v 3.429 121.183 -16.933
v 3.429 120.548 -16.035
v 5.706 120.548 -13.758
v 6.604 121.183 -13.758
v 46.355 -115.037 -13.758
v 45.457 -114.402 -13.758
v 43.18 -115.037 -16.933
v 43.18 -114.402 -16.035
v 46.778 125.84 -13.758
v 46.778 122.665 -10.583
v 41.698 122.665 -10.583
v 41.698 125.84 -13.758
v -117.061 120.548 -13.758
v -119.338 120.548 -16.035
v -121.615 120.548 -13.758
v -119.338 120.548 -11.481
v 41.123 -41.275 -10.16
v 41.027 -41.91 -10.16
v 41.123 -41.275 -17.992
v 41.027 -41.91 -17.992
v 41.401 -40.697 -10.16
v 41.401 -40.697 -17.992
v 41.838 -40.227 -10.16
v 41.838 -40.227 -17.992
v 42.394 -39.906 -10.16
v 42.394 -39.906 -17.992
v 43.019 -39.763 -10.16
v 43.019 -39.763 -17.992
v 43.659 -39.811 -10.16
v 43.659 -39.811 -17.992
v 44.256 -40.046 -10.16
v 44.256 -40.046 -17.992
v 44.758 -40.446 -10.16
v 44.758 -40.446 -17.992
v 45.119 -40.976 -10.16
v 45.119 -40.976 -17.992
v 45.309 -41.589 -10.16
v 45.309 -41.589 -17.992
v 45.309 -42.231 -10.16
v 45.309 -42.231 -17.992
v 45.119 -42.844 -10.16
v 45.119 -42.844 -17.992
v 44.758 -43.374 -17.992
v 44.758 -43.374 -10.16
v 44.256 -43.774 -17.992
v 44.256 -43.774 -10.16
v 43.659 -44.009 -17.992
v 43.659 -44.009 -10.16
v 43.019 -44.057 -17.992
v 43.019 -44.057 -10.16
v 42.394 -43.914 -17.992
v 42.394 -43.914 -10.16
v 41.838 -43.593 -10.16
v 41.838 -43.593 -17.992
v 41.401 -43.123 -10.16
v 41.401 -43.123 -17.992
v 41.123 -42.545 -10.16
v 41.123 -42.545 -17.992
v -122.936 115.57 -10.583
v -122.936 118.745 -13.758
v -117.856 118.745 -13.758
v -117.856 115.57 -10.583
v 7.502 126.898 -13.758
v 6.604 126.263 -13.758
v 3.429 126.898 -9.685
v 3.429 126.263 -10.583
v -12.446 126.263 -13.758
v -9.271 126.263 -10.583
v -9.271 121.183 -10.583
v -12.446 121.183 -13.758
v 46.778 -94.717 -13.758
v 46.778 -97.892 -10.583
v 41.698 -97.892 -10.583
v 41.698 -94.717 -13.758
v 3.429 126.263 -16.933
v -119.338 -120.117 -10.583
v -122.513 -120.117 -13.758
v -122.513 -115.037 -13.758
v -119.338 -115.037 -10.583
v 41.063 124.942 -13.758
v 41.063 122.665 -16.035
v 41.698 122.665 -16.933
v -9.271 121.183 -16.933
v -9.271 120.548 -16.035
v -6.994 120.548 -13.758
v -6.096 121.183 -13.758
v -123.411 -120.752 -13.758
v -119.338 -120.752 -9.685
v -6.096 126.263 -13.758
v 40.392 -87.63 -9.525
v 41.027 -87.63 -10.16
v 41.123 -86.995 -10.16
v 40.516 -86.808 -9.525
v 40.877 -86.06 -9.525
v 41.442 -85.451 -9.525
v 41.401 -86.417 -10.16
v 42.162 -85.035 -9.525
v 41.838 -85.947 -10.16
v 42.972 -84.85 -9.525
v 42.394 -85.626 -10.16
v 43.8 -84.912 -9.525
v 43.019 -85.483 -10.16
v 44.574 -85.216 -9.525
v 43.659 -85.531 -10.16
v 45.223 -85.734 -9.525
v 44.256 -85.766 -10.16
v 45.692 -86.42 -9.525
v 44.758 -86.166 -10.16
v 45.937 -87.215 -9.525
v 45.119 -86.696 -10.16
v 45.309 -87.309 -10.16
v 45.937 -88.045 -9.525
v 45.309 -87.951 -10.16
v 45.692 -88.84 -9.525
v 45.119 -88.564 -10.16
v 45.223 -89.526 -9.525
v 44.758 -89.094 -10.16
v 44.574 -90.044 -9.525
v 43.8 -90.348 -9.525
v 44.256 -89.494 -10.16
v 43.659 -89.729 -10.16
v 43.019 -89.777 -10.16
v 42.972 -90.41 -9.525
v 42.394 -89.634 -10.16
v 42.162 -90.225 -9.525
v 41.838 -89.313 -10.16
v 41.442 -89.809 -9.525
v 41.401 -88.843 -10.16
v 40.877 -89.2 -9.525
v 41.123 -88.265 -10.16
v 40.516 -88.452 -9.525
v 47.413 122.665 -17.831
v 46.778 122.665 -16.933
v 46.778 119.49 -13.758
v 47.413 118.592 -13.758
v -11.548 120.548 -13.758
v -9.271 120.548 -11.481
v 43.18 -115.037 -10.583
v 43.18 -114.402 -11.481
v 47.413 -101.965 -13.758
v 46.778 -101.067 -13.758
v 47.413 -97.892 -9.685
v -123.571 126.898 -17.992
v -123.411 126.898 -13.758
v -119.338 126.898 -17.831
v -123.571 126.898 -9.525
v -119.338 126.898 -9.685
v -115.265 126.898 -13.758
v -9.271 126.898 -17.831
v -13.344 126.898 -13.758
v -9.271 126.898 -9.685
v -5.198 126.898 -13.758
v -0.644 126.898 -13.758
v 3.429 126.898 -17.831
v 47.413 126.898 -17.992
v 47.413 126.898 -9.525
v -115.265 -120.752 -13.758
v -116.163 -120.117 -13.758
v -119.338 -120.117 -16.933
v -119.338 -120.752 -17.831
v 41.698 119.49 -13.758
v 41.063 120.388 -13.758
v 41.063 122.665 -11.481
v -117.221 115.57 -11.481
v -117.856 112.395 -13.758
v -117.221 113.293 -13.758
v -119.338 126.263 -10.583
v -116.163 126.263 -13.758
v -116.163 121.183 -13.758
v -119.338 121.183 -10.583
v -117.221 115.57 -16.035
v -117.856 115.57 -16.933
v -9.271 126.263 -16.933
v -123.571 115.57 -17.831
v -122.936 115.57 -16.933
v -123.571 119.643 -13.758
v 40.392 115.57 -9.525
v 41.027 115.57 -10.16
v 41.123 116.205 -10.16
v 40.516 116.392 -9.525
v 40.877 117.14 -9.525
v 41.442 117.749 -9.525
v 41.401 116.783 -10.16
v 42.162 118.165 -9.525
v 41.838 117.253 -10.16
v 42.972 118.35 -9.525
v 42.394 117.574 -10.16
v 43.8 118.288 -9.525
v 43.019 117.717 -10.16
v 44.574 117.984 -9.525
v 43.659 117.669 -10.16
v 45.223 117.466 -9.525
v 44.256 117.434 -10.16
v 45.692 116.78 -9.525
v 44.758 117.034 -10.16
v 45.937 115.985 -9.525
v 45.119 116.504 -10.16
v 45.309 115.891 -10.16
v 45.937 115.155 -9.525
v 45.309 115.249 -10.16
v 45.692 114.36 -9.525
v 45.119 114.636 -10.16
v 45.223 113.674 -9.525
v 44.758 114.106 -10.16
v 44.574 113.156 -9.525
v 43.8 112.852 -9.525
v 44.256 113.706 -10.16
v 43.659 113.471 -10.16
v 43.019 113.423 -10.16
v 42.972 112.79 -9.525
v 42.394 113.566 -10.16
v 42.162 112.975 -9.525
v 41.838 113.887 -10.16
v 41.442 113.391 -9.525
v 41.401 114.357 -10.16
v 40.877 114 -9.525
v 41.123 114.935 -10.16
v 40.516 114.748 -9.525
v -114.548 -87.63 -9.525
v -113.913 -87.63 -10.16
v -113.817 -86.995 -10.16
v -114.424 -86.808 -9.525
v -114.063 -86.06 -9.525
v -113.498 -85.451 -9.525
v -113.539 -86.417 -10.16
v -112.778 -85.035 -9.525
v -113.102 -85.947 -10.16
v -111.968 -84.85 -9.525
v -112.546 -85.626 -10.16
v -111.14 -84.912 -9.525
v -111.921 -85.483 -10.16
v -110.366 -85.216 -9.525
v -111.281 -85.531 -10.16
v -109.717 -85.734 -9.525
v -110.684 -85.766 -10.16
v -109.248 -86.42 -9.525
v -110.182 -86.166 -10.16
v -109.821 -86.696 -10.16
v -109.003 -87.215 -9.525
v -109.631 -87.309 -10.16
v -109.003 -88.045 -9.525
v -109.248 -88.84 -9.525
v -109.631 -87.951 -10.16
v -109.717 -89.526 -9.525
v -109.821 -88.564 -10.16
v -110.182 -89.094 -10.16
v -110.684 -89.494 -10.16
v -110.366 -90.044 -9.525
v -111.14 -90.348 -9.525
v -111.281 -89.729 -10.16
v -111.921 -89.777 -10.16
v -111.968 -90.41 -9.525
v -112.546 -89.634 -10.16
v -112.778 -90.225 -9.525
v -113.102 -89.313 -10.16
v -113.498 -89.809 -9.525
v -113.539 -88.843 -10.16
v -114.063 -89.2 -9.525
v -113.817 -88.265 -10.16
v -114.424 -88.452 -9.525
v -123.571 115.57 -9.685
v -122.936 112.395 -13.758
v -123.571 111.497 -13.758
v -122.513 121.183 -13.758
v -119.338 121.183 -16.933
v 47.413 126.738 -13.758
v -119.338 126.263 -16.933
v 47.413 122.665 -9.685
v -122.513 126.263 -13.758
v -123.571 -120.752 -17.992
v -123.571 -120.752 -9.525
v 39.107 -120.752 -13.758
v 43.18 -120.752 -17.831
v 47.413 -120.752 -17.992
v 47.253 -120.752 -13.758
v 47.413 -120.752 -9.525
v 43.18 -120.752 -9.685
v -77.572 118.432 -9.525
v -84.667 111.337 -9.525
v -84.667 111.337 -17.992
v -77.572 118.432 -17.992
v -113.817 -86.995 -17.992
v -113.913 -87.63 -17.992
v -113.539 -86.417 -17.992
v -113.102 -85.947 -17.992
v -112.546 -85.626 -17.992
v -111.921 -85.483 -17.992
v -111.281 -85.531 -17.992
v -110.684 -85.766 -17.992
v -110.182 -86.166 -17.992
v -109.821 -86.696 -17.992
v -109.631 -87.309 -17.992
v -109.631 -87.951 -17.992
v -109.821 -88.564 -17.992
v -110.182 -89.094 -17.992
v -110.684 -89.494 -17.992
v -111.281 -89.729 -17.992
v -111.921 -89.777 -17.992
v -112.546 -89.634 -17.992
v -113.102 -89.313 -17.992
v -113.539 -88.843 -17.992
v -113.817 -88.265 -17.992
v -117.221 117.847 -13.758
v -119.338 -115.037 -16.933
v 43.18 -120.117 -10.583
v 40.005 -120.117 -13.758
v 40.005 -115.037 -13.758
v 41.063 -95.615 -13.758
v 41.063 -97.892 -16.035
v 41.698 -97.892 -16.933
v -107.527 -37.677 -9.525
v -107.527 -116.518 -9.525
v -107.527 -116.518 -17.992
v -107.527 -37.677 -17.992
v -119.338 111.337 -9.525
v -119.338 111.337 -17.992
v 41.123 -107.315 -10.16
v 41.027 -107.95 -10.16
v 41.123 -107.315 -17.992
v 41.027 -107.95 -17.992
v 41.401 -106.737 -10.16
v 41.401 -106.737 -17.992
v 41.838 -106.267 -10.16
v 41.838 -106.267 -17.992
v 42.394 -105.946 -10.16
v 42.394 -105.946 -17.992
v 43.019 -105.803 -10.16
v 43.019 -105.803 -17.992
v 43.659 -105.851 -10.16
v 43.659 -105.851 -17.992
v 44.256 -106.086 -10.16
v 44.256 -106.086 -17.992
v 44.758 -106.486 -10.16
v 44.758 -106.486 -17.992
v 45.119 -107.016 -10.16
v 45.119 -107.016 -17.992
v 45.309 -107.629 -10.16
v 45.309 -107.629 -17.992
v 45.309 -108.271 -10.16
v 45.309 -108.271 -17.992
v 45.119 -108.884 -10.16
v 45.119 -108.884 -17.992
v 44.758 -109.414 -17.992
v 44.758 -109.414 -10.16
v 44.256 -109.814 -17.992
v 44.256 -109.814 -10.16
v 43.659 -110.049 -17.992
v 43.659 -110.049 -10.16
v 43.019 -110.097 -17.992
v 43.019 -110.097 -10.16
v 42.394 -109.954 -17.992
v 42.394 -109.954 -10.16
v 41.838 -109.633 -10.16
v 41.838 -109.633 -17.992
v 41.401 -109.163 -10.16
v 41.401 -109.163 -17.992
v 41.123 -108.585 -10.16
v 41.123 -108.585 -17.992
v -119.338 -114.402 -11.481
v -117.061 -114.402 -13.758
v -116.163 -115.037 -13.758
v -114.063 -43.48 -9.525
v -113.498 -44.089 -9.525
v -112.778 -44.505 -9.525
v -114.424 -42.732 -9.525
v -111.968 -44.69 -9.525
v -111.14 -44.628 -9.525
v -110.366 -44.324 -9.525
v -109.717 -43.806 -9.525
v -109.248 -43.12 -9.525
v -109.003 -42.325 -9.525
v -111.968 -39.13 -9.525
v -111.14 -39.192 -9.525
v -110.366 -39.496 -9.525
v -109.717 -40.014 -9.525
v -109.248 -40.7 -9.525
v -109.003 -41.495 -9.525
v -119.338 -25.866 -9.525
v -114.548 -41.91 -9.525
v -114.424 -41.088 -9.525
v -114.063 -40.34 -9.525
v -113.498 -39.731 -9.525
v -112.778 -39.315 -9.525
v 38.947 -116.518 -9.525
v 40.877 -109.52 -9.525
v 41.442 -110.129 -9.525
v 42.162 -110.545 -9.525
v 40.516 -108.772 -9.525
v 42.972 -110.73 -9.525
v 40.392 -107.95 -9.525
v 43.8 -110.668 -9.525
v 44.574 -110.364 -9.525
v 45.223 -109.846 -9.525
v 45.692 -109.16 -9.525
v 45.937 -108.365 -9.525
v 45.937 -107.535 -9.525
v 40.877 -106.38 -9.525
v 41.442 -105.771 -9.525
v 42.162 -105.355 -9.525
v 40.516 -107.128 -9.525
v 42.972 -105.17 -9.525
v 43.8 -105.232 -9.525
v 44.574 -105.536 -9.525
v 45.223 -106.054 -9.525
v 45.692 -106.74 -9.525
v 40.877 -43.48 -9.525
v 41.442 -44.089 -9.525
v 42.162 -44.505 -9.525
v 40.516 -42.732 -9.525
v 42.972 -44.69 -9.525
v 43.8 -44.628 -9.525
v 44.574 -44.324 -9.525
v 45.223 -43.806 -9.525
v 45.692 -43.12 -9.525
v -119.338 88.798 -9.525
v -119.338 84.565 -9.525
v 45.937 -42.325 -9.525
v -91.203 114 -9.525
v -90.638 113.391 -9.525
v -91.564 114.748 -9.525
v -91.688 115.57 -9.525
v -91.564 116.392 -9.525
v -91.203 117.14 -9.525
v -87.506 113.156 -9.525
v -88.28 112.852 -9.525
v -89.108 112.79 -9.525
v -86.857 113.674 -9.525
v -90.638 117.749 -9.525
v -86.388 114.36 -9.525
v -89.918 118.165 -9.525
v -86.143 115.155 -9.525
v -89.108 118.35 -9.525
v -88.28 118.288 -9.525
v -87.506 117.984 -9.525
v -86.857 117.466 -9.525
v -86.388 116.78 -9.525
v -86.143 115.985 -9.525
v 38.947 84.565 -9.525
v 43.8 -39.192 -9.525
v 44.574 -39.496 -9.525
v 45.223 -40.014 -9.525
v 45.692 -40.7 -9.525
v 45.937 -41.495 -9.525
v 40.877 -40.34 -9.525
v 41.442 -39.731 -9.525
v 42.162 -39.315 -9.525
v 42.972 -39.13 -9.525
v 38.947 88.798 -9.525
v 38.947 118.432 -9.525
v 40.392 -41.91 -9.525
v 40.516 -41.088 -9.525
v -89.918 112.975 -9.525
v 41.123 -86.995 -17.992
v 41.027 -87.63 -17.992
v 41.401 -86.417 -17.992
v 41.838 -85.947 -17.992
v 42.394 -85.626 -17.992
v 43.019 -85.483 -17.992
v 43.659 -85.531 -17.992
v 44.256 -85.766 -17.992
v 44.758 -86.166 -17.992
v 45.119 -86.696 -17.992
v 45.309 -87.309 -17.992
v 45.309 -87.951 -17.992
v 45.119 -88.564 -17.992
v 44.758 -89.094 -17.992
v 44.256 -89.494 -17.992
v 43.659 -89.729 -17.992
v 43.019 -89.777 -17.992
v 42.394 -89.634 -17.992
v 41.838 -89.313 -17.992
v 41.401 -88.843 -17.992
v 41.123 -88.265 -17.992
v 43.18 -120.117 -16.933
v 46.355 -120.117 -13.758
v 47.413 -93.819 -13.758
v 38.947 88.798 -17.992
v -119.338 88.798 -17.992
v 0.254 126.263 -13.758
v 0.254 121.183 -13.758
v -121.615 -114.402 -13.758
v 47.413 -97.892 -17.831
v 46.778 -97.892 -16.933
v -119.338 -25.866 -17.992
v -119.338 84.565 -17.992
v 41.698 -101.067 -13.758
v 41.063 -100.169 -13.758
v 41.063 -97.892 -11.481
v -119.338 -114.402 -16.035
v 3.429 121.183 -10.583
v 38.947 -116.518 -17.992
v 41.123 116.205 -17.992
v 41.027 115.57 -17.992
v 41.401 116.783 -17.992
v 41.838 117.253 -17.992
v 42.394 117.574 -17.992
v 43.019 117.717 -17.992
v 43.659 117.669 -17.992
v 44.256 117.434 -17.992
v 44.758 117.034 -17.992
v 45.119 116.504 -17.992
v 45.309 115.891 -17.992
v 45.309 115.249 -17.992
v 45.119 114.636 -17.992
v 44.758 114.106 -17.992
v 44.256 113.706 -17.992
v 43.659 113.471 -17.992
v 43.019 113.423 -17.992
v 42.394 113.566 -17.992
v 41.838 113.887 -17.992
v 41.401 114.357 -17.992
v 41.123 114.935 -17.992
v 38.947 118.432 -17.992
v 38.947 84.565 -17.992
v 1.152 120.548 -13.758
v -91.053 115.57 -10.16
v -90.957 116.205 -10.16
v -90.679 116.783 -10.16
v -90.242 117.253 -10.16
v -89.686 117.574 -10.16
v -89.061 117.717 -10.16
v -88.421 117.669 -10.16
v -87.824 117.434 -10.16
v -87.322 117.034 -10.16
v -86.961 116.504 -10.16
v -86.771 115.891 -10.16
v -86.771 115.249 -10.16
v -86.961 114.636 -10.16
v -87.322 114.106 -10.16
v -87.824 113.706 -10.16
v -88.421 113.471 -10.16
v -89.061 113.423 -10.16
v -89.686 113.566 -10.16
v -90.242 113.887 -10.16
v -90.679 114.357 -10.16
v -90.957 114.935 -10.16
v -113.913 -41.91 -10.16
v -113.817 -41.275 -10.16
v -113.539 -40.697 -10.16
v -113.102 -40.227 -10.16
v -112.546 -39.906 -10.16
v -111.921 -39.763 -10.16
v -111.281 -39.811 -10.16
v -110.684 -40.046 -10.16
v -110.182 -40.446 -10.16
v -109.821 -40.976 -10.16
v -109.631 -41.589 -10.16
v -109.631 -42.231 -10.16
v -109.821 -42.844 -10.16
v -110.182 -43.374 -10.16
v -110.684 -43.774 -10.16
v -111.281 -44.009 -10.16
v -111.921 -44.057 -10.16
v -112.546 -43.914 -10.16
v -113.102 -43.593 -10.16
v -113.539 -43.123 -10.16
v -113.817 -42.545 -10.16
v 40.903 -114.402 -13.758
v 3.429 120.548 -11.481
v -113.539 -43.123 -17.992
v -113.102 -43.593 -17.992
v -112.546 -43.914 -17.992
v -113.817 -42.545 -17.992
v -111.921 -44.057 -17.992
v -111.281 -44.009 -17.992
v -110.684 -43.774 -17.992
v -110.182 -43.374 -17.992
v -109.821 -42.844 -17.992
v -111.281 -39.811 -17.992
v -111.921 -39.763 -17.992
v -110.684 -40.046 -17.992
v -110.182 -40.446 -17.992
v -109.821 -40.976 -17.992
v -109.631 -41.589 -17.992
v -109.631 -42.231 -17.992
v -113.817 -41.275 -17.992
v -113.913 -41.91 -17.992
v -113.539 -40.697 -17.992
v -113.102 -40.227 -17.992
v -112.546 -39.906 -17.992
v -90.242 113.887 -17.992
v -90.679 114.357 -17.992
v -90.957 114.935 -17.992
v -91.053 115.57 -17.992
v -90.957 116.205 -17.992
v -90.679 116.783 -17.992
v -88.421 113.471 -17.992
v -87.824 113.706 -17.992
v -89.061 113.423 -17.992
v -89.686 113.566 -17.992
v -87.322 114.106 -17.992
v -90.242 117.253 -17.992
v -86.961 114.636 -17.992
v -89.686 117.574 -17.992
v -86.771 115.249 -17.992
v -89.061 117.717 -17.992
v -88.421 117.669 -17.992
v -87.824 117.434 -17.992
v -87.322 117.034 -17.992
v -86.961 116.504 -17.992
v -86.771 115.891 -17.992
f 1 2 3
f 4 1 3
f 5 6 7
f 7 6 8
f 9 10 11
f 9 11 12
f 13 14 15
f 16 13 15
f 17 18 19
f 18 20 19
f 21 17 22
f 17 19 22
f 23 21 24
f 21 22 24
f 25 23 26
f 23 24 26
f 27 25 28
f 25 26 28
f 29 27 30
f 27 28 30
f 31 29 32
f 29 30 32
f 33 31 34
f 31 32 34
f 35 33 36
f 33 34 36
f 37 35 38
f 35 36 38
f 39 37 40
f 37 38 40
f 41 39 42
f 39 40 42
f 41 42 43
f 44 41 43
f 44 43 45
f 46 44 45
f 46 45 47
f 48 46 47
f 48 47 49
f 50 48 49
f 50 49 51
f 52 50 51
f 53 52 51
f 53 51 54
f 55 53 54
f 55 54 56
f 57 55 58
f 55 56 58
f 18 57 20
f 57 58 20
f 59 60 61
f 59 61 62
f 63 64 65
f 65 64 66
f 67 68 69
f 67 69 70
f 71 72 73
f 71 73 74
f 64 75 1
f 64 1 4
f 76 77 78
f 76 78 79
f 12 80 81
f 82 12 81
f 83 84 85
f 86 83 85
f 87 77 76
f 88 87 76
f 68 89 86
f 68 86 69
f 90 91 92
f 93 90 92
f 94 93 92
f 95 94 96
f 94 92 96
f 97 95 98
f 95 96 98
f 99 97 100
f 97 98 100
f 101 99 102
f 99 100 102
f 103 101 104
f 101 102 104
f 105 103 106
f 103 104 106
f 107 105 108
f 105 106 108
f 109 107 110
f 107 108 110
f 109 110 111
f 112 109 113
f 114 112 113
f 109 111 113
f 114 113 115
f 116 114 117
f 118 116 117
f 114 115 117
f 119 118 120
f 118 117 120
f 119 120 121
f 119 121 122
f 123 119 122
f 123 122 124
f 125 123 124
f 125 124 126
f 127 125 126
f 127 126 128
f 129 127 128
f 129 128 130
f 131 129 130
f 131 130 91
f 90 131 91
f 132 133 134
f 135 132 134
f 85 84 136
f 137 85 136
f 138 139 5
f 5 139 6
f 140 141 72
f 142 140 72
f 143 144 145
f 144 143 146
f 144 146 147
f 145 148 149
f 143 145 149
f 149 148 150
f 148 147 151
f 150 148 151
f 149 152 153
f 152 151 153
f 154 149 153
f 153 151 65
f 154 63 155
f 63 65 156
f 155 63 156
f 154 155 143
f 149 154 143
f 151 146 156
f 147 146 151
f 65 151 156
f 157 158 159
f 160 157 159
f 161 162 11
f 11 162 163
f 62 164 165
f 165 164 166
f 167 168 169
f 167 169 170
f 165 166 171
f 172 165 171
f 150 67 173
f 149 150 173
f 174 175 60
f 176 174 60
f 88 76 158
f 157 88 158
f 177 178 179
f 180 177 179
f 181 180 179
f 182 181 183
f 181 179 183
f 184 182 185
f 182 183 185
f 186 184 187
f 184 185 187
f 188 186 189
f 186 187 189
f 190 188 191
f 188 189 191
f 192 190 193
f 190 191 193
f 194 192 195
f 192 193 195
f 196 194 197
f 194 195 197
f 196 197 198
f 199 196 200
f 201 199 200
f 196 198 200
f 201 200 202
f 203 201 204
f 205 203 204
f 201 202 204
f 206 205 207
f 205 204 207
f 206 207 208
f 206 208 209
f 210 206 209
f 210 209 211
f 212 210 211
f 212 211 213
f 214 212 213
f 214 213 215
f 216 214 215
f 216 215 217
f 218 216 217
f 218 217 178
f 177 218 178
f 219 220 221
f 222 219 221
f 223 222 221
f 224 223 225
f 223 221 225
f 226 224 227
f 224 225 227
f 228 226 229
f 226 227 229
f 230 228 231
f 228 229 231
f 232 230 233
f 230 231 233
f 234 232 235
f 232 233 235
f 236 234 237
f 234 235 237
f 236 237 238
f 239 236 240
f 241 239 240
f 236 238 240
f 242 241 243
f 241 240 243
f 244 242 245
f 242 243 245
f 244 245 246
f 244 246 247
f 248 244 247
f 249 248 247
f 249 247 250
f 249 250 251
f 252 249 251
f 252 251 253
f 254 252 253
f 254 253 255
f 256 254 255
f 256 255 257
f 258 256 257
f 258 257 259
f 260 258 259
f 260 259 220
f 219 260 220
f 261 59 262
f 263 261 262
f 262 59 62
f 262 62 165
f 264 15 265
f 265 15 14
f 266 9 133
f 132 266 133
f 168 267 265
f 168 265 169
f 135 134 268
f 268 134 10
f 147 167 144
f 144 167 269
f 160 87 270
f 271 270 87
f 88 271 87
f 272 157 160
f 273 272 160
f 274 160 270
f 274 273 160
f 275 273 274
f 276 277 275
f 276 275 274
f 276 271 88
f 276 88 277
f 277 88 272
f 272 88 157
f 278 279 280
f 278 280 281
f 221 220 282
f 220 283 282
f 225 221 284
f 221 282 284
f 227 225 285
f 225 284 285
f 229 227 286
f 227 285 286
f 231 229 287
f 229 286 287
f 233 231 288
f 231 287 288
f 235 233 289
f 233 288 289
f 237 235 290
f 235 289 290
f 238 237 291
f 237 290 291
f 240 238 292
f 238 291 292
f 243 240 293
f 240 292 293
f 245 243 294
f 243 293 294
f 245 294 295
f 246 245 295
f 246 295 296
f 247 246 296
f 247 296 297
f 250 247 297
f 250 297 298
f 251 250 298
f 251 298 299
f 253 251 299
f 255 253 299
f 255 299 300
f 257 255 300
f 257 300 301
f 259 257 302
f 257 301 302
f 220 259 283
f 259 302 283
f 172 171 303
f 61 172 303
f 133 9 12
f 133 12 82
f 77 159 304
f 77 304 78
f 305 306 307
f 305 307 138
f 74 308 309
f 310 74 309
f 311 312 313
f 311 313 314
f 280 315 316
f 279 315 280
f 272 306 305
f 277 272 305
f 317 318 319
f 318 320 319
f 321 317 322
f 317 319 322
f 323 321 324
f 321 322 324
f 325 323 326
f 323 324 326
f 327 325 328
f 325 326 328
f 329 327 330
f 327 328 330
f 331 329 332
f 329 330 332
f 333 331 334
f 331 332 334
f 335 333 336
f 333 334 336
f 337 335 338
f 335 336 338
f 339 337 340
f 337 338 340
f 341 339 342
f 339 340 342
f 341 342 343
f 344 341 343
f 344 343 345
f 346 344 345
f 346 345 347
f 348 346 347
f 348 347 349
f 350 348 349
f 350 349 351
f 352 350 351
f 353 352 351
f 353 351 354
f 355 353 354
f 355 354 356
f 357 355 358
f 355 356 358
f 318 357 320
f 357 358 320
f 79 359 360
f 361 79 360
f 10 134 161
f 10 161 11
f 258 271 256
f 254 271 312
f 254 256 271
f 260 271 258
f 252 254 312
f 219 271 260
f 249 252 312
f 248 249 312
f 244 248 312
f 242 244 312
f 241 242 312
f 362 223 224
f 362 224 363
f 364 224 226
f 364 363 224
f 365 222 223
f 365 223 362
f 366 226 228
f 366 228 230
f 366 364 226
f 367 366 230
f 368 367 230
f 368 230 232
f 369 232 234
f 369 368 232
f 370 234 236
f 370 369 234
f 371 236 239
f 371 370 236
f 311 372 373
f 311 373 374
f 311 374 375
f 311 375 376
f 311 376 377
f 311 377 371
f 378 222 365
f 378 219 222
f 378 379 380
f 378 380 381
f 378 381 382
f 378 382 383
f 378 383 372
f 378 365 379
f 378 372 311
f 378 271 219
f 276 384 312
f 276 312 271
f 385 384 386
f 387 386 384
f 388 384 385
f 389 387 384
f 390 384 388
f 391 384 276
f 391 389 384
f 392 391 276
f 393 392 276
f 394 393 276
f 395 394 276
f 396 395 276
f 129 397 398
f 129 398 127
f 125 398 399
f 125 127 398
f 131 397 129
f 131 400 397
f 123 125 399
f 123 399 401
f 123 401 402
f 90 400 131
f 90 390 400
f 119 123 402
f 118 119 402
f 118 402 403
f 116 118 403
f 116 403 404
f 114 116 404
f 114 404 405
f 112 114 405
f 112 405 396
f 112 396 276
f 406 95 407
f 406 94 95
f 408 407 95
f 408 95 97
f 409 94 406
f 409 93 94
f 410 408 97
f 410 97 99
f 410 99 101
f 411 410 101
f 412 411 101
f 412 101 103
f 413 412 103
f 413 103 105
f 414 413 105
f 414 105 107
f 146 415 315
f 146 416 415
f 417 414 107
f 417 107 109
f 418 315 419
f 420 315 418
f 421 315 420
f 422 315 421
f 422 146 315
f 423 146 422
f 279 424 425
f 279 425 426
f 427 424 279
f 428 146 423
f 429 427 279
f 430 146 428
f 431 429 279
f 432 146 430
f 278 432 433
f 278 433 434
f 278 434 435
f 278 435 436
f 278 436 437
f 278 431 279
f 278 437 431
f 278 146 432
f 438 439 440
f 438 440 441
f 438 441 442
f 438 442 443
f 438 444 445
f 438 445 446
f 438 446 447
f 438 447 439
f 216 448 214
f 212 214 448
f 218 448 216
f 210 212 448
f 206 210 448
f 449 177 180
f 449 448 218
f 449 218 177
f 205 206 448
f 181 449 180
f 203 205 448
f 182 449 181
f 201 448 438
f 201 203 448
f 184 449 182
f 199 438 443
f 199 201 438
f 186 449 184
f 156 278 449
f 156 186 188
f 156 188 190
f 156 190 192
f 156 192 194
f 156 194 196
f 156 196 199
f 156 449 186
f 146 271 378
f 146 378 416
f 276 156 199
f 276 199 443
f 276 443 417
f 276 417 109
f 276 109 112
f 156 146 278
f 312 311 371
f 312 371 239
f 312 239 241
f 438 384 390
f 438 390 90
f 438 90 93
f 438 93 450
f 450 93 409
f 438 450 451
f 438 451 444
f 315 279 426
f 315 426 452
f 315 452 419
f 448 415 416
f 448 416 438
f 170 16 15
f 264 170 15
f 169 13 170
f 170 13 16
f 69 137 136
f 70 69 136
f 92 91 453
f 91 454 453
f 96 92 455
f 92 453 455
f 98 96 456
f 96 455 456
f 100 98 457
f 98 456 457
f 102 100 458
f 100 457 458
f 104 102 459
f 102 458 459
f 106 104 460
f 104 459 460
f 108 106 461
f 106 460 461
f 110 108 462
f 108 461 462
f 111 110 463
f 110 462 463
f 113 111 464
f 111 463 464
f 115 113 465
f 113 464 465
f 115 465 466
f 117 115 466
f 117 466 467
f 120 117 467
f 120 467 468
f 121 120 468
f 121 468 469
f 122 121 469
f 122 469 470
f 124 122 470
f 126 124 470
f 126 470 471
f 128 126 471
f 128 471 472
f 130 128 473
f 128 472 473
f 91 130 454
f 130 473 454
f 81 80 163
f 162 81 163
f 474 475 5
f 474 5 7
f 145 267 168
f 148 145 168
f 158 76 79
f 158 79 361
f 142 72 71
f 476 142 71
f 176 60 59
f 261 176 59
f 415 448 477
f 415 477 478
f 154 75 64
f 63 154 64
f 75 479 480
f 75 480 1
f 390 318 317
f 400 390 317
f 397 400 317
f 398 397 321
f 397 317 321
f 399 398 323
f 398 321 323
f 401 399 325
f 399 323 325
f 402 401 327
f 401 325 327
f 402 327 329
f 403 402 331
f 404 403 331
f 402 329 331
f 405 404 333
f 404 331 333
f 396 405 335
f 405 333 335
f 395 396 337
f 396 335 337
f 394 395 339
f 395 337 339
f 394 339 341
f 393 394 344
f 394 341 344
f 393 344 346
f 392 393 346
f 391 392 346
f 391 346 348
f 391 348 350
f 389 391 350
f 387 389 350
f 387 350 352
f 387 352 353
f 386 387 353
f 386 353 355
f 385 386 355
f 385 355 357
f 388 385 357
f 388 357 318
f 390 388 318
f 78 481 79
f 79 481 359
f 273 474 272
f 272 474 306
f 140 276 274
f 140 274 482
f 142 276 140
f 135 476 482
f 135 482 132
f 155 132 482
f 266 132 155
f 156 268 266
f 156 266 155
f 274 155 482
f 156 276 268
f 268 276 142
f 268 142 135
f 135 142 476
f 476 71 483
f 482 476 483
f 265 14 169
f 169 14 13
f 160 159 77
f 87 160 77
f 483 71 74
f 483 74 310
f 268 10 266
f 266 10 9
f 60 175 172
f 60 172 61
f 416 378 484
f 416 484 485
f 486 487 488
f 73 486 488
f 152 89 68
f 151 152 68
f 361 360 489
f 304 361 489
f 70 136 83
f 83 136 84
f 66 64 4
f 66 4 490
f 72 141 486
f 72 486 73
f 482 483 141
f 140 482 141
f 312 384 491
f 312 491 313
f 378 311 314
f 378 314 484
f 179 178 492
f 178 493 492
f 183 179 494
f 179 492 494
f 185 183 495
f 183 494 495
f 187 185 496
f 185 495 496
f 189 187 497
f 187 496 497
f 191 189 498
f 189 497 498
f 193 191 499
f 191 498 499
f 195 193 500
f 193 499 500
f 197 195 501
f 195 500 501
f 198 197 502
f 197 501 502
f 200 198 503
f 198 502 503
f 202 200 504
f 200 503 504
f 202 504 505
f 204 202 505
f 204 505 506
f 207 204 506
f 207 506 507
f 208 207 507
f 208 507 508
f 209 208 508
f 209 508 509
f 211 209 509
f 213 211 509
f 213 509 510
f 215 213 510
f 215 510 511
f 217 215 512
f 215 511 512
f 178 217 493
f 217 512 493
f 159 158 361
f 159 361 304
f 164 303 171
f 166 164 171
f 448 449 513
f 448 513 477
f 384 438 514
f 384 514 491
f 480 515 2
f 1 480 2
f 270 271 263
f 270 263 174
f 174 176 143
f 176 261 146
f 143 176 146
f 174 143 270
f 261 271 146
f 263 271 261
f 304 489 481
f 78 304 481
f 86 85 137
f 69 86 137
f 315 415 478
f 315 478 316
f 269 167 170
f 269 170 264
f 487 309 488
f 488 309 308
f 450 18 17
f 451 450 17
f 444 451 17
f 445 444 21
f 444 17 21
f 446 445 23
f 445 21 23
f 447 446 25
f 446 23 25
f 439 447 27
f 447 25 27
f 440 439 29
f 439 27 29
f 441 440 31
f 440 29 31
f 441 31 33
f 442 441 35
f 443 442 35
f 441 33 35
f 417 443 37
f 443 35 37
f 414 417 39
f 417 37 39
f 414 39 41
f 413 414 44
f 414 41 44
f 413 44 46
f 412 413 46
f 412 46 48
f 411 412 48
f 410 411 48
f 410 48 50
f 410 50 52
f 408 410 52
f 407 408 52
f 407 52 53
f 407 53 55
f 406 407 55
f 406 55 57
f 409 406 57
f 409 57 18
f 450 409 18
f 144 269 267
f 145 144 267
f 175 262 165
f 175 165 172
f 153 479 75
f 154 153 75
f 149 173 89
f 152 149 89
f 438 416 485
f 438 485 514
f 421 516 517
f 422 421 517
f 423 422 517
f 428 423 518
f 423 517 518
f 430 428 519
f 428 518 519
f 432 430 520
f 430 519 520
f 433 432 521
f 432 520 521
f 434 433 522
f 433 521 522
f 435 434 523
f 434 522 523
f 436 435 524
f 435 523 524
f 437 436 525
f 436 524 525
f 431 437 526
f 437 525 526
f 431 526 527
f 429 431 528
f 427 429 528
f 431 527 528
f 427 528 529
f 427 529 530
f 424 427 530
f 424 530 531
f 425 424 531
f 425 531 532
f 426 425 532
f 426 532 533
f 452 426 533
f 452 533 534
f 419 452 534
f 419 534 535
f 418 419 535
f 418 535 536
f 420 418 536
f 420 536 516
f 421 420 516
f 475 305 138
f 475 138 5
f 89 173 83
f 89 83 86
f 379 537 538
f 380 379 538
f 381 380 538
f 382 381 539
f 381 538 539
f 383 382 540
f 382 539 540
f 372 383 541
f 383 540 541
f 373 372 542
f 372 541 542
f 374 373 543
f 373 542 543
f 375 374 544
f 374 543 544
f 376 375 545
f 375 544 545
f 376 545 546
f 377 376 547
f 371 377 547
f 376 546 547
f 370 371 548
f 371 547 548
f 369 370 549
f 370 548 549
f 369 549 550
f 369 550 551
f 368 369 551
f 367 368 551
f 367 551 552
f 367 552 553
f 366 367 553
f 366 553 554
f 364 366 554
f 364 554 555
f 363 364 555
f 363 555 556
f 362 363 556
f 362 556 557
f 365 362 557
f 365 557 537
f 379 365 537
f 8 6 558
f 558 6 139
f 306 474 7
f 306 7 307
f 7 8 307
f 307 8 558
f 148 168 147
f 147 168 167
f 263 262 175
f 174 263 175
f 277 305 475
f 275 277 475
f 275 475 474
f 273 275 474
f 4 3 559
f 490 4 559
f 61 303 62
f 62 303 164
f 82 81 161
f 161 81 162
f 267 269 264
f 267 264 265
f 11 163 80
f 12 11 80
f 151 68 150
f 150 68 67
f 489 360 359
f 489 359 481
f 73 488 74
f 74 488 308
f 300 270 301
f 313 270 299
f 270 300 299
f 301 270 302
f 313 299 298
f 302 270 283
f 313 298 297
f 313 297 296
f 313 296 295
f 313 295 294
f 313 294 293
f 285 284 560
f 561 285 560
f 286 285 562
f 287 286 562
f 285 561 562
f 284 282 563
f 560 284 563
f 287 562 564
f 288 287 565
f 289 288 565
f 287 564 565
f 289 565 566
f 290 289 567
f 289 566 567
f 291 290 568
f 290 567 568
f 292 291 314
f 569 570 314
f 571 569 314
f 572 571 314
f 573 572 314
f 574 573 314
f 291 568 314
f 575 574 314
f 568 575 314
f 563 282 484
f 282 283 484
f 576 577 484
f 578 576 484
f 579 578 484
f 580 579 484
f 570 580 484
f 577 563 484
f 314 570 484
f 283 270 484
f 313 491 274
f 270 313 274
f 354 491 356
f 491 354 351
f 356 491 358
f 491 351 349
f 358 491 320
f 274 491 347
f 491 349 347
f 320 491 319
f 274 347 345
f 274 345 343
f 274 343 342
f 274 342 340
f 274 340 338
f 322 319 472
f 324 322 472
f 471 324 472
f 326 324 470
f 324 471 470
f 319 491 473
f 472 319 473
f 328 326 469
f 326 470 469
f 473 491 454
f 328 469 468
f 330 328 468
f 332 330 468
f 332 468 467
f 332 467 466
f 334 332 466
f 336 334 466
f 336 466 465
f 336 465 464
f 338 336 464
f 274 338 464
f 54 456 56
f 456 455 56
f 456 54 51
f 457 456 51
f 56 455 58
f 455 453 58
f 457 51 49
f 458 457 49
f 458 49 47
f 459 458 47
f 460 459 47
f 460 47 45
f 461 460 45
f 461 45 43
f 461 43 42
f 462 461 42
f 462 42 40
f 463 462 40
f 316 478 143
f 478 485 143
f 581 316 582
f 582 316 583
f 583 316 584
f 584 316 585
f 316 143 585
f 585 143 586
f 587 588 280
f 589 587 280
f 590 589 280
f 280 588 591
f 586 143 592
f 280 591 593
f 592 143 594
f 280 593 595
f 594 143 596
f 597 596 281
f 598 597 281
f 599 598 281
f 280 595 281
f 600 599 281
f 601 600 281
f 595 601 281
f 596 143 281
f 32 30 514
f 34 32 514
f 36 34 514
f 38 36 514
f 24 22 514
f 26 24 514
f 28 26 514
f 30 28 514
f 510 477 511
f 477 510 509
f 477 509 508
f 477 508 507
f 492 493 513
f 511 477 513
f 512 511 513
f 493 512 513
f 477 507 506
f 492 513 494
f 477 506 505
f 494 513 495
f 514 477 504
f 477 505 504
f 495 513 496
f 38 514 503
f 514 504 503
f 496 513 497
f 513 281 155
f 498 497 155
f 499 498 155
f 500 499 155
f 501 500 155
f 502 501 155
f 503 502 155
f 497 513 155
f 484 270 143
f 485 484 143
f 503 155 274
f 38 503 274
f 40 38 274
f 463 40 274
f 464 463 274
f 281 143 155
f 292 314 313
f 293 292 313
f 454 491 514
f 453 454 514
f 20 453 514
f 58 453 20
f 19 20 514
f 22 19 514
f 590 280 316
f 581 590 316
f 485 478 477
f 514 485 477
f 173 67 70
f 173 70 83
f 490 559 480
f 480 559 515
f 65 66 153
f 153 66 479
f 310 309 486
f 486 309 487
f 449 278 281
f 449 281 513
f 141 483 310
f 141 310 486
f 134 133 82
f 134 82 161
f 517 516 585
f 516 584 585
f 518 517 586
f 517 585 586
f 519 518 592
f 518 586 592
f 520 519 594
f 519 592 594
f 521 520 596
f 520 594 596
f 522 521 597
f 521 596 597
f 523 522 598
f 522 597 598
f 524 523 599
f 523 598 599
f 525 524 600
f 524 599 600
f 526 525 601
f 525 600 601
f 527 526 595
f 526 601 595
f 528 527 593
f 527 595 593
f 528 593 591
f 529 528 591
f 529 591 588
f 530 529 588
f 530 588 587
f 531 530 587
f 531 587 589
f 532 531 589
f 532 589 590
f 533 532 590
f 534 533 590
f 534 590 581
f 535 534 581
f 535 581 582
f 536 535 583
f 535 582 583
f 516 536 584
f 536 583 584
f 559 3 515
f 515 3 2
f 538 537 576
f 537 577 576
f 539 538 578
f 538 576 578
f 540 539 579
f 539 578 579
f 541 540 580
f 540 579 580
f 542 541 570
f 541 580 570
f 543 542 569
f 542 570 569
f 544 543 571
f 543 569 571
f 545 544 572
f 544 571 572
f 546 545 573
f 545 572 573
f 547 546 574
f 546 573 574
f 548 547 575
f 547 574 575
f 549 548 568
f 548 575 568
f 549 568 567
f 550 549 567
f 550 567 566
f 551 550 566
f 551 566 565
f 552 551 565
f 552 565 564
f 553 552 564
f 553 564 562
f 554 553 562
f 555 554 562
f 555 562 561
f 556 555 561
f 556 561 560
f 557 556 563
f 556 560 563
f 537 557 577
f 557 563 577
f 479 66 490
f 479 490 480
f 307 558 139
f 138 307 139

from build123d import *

# Parameters (mm, degrees)
BOSS_EXTRUDE1_START                    = -9.525
SKETCH1_W                              = 170.984333333
SKETCH1_H                              = 247.65
BOSS_EXTRUDE1_DEPTH                    = 8.466666667
F_18_0_1695_DIAMETER_HOLE1_D           = 4.3053
F_18_0_1695_DIAMETER_HOLE1_CSINK_D     = 5.5753
F_18_0_1695_DIAMETER_HOLE1_CSINK_ANGLE = 90
BOTTOM_PINS_DEPTH                      = 6.35
REAR_PINS_DEPTH                        = 6.35
FRONT_PINS_DEPTH                       = 6.35
CUT_EXTRUDE1_DEPTH                     = 6.35
PIN_CHAMFERS_SIZE                      = 0.635


with BuildPart() as part:
    # Sketch1 → Boss-Extrude1 (new body)
    with BuildSketch(Plane.XY.offset(BOSS_EXTRUDE1_START)):
        with Locations((-38.078833334, 3.0734)):
            Rectangle(SKETCH1_W, SKETCH1_H)
        Polygon((-107.526666667, -116.518266667), (-107.526666667, -37.676666709), (-119.337666709, -25.865666667), (-119.337666709, 84.565066667), (38.946666667, 84.565066667), (38.946666667, -116.518266667), align=None, mode=Mode.SUBTRACT)
        Polygon((-119.337666709, 111.336666667), (-84.666666667, 111.336666667), (-77.5716, 118.431733333), (38.946666667, 118.431733333), (38.946666667, 88.7984), (-119.337666709, 88.7984), align=None, mode=Mode.SUBTRACT)
    extrude(amount=-BOSS_EXTRUDE1_DEPTH)

    # #18 (0.1695) Diameter Hole1 (through all)
    with Locations(Plane.XY.offset(-9.525)):
        with Locations((-88.9, 115.57), (43.18, 115.57), (43.18, -41.91), (43.18, -87.63), (43.18, -107.95), (-111.76, -87.63), (-111.76, -41.91)):
            CounterSinkHole(F_18_0_1695_DIAMETER_HOLE1_D / 2, F_18_0_1695_DIAMETER_HOLE1_CSINK_D / 2, counter_sink_angle=F_18_0_1695_DIAMETER_HOLE1_CSINK_ANGLE)

    # Sketch2 → bottom pins (cut)
    with BuildSketch(Plane.XZ.offset(120.7516)):
        Polygon((-122.512666667, -13.758333333), (-119.337666667, -10.583333333), (-116.162666667, -13.758333333), (-119.337666667, -16.933333333), align=None)
        Polygon((40.005, -13.758333333), (43.18, -10.583333333), (46.355, -13.758333333), (43.18, -16.933333333), align=None)
    extrude(amount=-BOTTOM_PINS_DEPTH, mode=Mode.SUBTRACT)

    # Sketch3 → rear pins (cut)
    with BuildSketch(Plane.ZY.offset(123.571)):
        Polygon((-16.933333333, 115.57), (-13.758333333, 118.745), (-10.583333333, 115.57), (-13.758333333, 112.395), align=None)
    extrude(amount=-REAR_PINS_DEPTH, mode=Mode.SUBTRACT)

    # Sketch4 → front pins (cut)
    with BuildSketch(Plane(origin=(47.413333333, 0, 0), x_dir=(0, 0, -1), z_dir=(1, 0, 0))):
        Polygon((10.583333333, 122.665066667), (13.758333333, 125.840066667), (16.933333333, 122.665066667), (13.758333333, 119.490066667), align=None)
        Polygon((10.583333333, -97.8916), (13.758333333, -94.7166), (16.933333333, -97.8916), (13.758333333, -101.0666), align=None)
    extrude(amount=-FRONT_PINS_DEPTH, mode=Mode.SUBTRACT)

    # Sketch7 → Cut-Extrude1 (cut)
    with BuildSketch(Plane(origin=(0, 126.8984, 0), x_dir=(1, 0, 0), z_dir=(0, 1, 0))):
        Polygon((-6.095999915, 13.758333333), (-9.270999915, 10.583333333), (-12.445999915, 13.758333333), (-9.270999915, 16.933333333), align=None)
        Polygon((-116.162666667, 13.758333333), (-119.337666667, 10.583333333), (-122.512666667, 13.758333333), (-119.337666667, 16.933333333), align=None)
        Polygon((0.254000085, 13.758333333), (3.429000085, 16.933333333), (6.604000085, 13.758333333), (3.429000085, 10.583333333), align=None)
    extrude(amount=-CUT_EXTRUDE1_DEPTH, mode=Mode.SUBTRACT)

    # pin chamfers
    pin_chamfers_edges = [part.edges().sort_by_distance(p)[0] for p in [
        (-120.925166667, -114.4016, -15.345833333),
        (-120.925166667, -114.4016, -12.170833333),
        (-117.750166667, -114.4016, -12.170833333),
        (-117.750166667, -114.4016, -15.345833333),
        (-120.925166667, -120.7516, -15.345833333),
        (-117.750166667, -120.7516, -15.345833333),
        (-117.750166667, -120.7516, -12.170833333),
        (-120.925166667, -120.7516, -12.170833333),
        (41.5925, -114.4016, -15.345833333),
        (41.5925, -114.4016, -12.170833333),
        (44.7675, -114.4016, -12.170833333),
        (44.7675, -114.4016, -15.345833333),
        (41.5925, -120.7516, -15.345833333),
        (44.7675, -120.7516, -15.345833333),
        (44.7675, -120.7516, -12.170833333),
        (41.5925, -120.7516, -12.170833333),
        (-117.221, 113.9825, -15.345833333),
        (-117.221, 117.1575, -15.345833333),
        (-117.221, 117.1575, -12.170833333),
        (-117.221, 113.9825, -12.170833333),
        (-123.571, 113.9825, -15.345833333),
        (-123.571, 113.9825, -12.170833333),
        (-123.571, 117.1575, -12.170833333),
        (-123.571, 117.1575, -15.345833333),
        (41.063333333, 121.077566667, -12.170833333),
        (41.063333333, 124.252566667, -12.170833333),
        (41.063333333, 124.252566667, -15.345833333),
        (41.063333333, 121.077566667, -15.345833333),
        (47.413333333, 121.077566667, -12.170833333),
        (47.413333333, 121.077566667, -15.345833333),
        (47.413333333, 124.252566667, -15.345833333),
        (47.413333333, 124.252566667, -12.170833333),
        (41.063333333, -99.4791, -12.170833333),
        (41.063333333, -96.3041, -12.170833333),
        (41.063333333, -96.3041, -15.345833333),
        (41.063333333, -99.4791, -15.345833333),
        (47.413333333, -99.4791, -12.170833333),
        (47.413333333, -99.4791, -15.345833333),
        (47.413333333, -96.3041, -15.345833333),
        (47.413333333, -96.3041, -12.170833333),
        (1.841500085, 120.5484, -12.170833333),
        (1.841500085, 120.5484, -15.345833333),
        (5.016500085, 120.5484, -15.345833333),
        (5.016500085, 120.5484, -12.170833333),
        (1.841500085, 126.8984, -12.170833333),
        (5.016500085, 126.8984, -12.170833333),
        (5.016500085, 126.8984, -15.345833333),
        (1.841500085, 126.8984, -15.345833333),
        (-117.750166667, 120.5484, -15.345833333),
        (-117.750166667, 120.5484, -12.170833333),
        (-120.925166667, 120.5484, -12.170833333),
        (-120.925166667, 120.5484, -15.345833333),
        (-117.750166667, 126.8984, -15.345833333),
        (-120.925166667, 126.8984, -15.345833333),
        (-120.925166667, 126.8984, -12.170833333),
        (-117.750166667, 126.8984, -12.170833333),
        (-7.683499915, 120.5484, -15.345833333),
        (-7.683499915, 120.5484, -12.170833333),
        (-10.858499915, 120.5484, -12.170833333),
        (-10.858499915, 120.5484, -15.345833333),
        (-7.683499915, 126.8984, -15.345833333),
        (-10.858499915, 126.8984, -15.345833333),
        (-10.858499915, 126.8984, -12.170833333),
        (-7.683499915, 126.8984, -12.170833333),
    ]]
    chamfer(pin_chamfers_edges, length=PIN_CHAMFERS_SIZE)


solid = part.part
